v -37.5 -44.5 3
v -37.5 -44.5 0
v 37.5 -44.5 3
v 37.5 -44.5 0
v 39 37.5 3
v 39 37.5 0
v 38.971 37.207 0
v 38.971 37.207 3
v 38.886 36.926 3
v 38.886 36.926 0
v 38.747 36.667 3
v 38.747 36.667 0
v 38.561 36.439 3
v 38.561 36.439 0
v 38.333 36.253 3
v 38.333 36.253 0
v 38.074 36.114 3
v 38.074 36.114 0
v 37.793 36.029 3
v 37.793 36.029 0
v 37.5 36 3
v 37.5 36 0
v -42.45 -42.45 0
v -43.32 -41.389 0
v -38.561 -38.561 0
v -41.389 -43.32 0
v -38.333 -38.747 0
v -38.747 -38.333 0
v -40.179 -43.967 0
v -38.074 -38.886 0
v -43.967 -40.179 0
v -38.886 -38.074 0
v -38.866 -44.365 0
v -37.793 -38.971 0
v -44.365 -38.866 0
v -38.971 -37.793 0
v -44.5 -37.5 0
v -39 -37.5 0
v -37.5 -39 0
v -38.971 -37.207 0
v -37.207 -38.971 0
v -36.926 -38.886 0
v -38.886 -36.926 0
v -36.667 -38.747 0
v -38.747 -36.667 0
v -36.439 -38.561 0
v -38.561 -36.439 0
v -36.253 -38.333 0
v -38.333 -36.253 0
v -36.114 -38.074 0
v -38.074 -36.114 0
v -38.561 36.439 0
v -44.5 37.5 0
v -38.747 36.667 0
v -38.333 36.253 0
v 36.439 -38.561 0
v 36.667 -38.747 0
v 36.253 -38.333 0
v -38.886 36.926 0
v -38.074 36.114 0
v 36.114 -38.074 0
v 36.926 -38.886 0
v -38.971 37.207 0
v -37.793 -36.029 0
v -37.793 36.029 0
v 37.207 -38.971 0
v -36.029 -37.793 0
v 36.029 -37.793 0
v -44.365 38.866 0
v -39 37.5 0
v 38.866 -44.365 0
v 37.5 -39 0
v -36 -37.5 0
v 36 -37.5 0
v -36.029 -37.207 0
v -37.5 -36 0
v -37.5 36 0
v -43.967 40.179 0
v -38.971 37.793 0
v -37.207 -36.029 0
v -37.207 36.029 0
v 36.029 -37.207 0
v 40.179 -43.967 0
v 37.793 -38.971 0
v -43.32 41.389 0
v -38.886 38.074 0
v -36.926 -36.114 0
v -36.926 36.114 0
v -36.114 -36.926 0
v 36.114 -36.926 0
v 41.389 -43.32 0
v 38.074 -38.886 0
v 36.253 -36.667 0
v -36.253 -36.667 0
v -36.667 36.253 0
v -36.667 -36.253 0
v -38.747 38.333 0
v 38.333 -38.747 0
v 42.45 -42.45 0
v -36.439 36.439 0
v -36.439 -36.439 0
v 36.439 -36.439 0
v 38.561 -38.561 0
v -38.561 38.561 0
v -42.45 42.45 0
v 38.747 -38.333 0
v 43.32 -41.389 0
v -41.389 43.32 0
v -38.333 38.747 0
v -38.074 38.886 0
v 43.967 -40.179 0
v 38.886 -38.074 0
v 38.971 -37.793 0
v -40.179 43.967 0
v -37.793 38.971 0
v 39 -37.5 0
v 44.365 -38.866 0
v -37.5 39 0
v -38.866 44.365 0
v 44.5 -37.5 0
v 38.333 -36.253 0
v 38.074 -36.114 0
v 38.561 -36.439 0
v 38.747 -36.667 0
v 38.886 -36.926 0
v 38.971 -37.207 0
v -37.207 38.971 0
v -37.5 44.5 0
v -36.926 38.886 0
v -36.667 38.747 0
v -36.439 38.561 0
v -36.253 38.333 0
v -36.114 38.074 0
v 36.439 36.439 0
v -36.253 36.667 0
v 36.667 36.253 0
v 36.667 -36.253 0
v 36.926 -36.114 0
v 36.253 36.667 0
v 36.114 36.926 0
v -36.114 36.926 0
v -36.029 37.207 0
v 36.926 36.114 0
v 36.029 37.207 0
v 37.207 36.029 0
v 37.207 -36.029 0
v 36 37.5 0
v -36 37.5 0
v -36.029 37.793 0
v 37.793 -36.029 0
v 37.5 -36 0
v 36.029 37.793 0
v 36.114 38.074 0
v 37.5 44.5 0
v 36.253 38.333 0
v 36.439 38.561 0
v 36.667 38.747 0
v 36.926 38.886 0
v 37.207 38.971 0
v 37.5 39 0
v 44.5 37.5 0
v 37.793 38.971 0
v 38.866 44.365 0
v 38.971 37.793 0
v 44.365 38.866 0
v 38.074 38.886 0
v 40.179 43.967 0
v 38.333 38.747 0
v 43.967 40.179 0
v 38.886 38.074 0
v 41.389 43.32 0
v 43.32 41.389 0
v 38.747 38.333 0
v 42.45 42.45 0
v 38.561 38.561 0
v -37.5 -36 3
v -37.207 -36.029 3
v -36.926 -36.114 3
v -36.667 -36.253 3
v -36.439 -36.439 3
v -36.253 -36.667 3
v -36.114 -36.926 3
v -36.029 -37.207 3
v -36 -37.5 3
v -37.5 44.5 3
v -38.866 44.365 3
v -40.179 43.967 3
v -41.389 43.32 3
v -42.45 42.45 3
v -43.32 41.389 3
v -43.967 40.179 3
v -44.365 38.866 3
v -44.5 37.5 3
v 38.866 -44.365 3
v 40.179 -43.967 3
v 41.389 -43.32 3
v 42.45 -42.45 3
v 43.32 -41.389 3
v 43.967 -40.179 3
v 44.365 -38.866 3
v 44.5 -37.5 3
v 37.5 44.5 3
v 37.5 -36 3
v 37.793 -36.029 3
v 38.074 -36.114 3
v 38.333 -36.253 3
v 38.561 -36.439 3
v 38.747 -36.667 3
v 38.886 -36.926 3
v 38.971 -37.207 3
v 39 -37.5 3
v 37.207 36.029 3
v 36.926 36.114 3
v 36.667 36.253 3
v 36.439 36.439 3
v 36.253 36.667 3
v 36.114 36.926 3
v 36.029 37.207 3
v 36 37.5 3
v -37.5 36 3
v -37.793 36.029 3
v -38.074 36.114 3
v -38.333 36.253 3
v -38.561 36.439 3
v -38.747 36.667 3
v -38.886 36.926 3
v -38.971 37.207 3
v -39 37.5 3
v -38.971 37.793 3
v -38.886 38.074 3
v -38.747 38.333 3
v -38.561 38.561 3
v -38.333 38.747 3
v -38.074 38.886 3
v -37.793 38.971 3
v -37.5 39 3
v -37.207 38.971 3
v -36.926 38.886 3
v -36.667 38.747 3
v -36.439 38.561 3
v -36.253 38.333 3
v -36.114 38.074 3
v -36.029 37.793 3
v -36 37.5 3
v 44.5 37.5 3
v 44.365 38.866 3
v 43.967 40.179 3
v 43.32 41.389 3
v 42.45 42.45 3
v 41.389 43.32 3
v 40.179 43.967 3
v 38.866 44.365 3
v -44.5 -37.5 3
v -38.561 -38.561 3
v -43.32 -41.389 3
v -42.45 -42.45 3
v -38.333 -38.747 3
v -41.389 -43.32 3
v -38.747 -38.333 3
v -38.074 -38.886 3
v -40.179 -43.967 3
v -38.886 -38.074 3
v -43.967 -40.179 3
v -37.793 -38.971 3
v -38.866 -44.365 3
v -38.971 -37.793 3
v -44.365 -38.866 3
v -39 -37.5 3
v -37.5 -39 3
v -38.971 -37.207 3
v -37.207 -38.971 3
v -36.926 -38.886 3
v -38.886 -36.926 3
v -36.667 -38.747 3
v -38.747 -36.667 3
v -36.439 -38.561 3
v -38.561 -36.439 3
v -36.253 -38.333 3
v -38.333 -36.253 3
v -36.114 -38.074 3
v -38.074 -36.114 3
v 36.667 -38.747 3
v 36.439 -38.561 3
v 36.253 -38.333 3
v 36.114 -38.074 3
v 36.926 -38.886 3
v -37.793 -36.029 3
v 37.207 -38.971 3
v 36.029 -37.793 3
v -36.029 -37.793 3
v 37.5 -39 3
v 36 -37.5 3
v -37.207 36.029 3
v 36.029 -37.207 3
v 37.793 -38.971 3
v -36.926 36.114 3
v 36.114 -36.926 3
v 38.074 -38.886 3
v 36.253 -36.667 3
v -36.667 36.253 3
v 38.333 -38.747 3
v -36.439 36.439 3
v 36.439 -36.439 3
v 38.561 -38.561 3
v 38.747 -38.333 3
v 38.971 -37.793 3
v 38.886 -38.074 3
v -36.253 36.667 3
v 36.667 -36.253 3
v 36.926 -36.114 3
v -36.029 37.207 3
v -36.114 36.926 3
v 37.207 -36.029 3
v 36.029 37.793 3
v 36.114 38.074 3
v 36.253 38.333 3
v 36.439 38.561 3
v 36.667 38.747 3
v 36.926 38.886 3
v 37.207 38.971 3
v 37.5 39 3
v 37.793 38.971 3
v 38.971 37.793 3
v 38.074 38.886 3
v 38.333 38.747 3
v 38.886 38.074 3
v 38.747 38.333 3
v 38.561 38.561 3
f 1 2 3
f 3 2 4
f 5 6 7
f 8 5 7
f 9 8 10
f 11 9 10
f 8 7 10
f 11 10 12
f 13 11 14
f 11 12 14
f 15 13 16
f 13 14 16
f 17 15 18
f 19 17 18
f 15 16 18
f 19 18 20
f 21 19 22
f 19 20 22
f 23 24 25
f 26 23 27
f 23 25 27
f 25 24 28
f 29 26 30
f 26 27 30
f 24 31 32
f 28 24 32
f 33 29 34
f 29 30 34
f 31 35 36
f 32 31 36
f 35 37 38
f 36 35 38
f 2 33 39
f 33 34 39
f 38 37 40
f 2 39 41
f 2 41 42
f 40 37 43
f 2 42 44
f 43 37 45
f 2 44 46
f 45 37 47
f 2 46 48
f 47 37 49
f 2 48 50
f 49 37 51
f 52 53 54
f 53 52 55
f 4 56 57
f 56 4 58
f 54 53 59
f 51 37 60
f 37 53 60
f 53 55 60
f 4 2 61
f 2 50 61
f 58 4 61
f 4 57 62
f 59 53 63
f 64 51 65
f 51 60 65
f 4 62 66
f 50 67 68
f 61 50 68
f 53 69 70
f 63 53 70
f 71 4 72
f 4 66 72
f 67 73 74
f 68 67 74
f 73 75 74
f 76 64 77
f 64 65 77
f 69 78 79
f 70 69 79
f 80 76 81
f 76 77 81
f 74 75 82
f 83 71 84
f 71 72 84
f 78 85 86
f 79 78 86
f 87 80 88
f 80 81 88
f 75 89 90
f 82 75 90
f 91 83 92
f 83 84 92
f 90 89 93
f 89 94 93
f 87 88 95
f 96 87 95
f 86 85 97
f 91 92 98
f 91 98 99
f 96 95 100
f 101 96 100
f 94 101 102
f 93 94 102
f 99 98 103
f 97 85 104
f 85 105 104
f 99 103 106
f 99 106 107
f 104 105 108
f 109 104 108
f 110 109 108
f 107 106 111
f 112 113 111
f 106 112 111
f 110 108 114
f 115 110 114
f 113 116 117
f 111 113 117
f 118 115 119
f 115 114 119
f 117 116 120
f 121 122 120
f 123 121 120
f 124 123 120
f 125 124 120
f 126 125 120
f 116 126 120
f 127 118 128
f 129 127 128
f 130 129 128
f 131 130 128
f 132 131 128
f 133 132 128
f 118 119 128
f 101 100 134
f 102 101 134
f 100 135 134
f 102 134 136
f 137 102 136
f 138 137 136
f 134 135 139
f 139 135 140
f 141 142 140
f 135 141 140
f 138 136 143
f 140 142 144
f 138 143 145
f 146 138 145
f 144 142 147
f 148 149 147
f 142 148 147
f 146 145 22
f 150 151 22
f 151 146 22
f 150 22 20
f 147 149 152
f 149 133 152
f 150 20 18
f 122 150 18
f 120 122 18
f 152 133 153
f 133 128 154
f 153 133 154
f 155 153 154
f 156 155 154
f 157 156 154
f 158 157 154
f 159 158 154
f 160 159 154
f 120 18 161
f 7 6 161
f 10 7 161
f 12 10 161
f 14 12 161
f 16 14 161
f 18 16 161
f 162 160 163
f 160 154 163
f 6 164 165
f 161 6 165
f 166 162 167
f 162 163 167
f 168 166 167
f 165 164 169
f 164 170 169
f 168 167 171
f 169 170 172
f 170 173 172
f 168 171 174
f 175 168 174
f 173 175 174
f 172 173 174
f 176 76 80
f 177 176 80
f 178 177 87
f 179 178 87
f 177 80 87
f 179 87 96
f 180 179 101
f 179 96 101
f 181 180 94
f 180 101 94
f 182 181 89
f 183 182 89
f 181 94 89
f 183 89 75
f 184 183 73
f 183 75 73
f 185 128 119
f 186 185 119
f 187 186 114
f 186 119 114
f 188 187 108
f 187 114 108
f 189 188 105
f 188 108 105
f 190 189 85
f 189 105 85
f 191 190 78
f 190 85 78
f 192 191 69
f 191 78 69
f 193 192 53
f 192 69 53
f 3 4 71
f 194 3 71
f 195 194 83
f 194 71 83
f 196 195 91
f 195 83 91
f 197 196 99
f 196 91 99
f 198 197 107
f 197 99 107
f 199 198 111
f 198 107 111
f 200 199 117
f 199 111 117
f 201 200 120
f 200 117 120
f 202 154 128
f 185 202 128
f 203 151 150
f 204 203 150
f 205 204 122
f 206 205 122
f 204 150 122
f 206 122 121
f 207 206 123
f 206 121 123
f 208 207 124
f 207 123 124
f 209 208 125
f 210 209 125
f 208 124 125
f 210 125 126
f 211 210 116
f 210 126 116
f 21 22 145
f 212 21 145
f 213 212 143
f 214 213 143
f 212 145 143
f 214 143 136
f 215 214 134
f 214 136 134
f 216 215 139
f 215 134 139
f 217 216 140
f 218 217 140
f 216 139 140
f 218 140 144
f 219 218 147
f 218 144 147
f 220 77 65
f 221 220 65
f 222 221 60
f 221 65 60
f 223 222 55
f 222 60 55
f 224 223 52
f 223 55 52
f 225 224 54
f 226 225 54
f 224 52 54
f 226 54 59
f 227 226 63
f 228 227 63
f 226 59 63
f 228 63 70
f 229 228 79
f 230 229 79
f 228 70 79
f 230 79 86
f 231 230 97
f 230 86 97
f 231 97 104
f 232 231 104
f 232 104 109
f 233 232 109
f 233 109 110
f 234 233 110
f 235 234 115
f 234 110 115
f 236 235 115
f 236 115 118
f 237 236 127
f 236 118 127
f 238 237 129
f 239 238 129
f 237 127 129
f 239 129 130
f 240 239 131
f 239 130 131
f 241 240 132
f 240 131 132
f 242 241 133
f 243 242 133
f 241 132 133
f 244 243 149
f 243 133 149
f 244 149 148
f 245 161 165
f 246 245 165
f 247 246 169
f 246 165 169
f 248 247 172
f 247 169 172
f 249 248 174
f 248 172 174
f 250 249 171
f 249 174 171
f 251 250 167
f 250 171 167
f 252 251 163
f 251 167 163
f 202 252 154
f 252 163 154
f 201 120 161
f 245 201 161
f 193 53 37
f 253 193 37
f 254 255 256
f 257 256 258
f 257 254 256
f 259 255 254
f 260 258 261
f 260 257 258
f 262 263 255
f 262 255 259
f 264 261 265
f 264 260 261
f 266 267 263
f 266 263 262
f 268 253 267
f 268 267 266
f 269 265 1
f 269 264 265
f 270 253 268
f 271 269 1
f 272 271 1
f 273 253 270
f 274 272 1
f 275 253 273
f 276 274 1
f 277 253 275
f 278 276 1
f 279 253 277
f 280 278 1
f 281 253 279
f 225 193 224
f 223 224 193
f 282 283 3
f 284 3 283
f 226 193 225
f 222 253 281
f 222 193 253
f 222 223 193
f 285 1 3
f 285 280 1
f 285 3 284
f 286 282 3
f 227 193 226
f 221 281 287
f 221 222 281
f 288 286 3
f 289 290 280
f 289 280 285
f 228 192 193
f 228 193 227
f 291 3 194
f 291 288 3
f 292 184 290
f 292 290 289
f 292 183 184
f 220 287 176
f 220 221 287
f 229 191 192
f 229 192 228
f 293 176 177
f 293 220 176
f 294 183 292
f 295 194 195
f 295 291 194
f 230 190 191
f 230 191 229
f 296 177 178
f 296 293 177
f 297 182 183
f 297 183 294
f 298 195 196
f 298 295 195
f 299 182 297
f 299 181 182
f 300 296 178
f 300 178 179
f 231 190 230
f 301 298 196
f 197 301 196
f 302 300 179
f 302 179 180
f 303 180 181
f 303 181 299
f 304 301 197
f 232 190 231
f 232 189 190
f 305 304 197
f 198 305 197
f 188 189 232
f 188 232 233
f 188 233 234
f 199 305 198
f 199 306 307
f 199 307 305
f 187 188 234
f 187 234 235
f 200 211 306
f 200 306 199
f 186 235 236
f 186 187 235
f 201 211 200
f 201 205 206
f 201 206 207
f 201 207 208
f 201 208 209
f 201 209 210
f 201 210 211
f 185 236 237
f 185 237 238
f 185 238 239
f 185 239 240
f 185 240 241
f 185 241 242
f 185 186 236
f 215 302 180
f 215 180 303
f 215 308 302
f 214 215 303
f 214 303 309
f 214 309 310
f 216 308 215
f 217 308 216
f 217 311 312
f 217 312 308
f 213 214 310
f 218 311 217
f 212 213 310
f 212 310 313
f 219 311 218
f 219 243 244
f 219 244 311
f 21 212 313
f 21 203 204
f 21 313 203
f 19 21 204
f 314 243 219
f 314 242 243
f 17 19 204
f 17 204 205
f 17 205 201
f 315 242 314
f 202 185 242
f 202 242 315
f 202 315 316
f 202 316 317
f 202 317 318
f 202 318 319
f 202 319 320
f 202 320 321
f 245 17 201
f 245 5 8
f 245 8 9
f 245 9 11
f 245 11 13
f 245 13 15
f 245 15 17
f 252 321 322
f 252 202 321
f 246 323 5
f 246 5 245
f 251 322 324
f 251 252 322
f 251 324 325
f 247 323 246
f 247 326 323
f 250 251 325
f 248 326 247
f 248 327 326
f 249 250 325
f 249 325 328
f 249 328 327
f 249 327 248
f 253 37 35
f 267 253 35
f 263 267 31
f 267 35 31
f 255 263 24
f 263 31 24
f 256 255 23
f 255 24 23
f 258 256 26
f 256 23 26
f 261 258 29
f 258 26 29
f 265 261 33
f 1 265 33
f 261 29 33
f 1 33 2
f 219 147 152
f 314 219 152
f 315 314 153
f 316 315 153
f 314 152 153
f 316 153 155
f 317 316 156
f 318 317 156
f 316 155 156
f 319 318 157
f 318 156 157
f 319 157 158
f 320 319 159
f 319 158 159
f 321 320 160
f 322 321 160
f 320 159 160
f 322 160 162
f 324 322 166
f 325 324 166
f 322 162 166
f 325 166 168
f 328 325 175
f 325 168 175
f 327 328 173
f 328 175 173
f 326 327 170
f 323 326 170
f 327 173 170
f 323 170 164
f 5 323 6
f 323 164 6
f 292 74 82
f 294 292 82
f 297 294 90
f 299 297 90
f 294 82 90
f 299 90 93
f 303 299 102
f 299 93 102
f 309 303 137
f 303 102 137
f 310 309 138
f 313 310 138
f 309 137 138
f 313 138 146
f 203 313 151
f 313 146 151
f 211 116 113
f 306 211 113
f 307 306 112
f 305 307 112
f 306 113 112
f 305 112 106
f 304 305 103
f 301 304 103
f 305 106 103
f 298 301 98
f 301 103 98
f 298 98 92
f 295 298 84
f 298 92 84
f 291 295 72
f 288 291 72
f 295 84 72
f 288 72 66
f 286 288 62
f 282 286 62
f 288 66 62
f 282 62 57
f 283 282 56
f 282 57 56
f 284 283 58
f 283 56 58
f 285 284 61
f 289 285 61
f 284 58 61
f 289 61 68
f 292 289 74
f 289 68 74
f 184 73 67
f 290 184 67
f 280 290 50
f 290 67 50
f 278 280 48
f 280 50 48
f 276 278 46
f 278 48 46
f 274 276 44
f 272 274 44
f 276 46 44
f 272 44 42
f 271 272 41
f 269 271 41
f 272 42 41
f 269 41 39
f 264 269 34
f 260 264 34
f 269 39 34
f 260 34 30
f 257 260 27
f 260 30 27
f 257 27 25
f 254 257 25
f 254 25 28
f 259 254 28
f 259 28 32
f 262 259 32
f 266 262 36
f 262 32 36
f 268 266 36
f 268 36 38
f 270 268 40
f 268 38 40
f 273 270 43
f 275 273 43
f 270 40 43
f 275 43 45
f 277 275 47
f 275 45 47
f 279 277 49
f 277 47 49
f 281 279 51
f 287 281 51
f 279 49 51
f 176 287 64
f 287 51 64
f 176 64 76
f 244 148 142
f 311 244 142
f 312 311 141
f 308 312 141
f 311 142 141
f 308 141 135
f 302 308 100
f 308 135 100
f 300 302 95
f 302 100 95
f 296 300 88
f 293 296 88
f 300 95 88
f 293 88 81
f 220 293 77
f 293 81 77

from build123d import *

# Parameters (mm, degrees)
F1_DEPTH = 3


with BuildPart() as f1:
    # F0 (on Top) → F1 (new body)
    with BuildSketch(Plane.XY):
        with BuildLine():
            ThreePointArc((-37.5, 44.5), (-32.5502525317, 42.4497474683), (-30.5, 37.5))
            Line((-30.5, 37.5), (30.5, 37.5))
            ThreePointArc((30.5, 37.5), (32.5502525317, 42.4497474683), (37.5, 44.5))
            Line((37.5, 44.5), (-37.5, 44.5))
        make_face()
        with BuildLine():
            Line((30.5, -37.5), (-30.5, -37.5))
            ThreePointArc((-30.5, -37.5), (-32.550252511, -42.4497474476), (-37.4999999416, -44.5))
            Line((-37.4999999416, -44.5), (37.5, -44.5))
            ThreePointArc((37.5, -44.5), (32.5502525317, -42.4497474683), (30.5, -37.5))
        make_face()
        with BuildLine():
            ThreePointArc((44.5, 37.5), (42.4497474683, 32.5502525317), (37.5, 30.5))
            Line((37.5, 30.5), (37.5, -30.5))
            ThreePointArc((37.5, -30.5), (42.4497474683, -32.5502525317), (44.5, -37.5))
            Line((44.5, -37.5), (44.5, 37.5))
        make_face()
        with BuildLine():
            Line((-37.5, -30.5), (-37.5, 30.5))
            ThreePointArc((-37.5, 30.5), (-42.4497474683, 32.5502525317), (-44.5, 37.5))
            Line((-44.5, 37.5), (-44.5, -37.4999999639))
            ThreePointArc((-44.5, -37.4999999639), (-42.4497474555, -32.5502525189), (-37.5, -30.5))
        make_face()
        with BuildLine():
            ThreePointArc((37.5, 44.5), (32.5502525317, 42.4497474683), (30.5, 37.5))
            Line((30.5, 37.5), (36, 37.5))
            ThreePointArc((36, 37.5), (37.5, 39), (39, 37.5))
            ThreePointArc((39, 37.5), (38.5606601718, 36.4393398282), (37.5, 36))
            Line((37.5, 36), (37.5, 30.5))
            ThreePointArc((37.5, 30.5), (42.4497474683, 32.5502525317), (44.5, 37.5))
            ThreePointArc((44.5, 37.5), (42.4497474683, 42.4497474683), (37.5, 44.5))
        make_face()
        with BuildLine():
            Line((-36, 37.5), (-30.5, 37.5))
            ThreePointArc((-30.5, 37.5), (-32.5502525317, 42.4497474683), (-37.5, 44.5))
            ThreePointArc((-37.5, 44.5), (-42.4497474683, 42.4497474683), (-44.5, 37.5))
            ThreePointArc((-44.5, 37.5), (-42.4497474683, 32.5502525317), (-37.5, 30.5))
            Line((-37.5, 30.5), (-37.5, 36))
            ThreePointArc((-37.5, 36), (-38.5606601718, 38.5606601718), (-36, 37.5))
        make_face()
        with BuildLine():
            ThreePointArc((44.5, -37.5), (42.4497474683, -32.5502525317), (37.5, -30.5))
            Line((37.5, -30.5), (37.5, -36))
            ThreePointArc((37.5, -36), (38.5606601718, -36.4393398282), (39, -37.5))
            ThreePointArc((39, -37.5), (37.5, -39), (36, -37.5))
            Line((36, -37.5), (30.5, -37.5))
            ThreePointArc((30.5, -37.5), (32.5502525317, -42.4497474683), (37.5, -44.5))
            ThreePointArc((37.5, -44.5), (42.4497474683, -42.4497474683), (44.5, -37.5))
        make_face()
        with BuildLine():
            Line((-37.5, -36), (-37.5, -30.5))
            ThreePointArc((-37.5, -30.5), (-42.4497474555, -32.5502525189), (-44.5, -37.4999999639))
            ThreePointArc((-44.5, -37.4999999639), (-42.4497474604, -42.4497474762), (-37.4999999416, -44.5))
            ThreePointArc((-37.4999999416, -44.5), (-32.550252511, -42.4497474476), (-30.5, -37.5))
            Line((-30.5, -37.5), (-36, -37.5))
            ThreePointArc((-36, -37.5), (-38.5606601718, -38.5606601718), (-37.5, -36))
        make_face()
        with BuildLine():
            Line((30.5, 37.5), (-30.5, 37.5))
            ThreePointArc((-30.5, 37.5), (-32.5502525317, 32.5502525317), (-37.5, 30.5))
            Line((-37.5, 30.5), (-37.5, -30.5))
            ThreePointArc((-37.5, -30.5), (-32.5502525317, -32.5502525317), (-30.5, -37.5))
            Line((-30.5, -37.5), (30.5, -37.5))
            ThreePointArc((30.5, -37.5), (32.5502525317, -32.5502525317), (37.5, -30.5))
            Line((37.5, -30.5), (37.5, 30.5))
            ThreePointArc((37.5, 30.5), (32.5502525317, 32.5502525317), (30.5, 37.5))
        make_face()
        with BuildLine():
            ThreePointArc((-37.5, 30.5), (-32.5502525317, 32.5502525317), (-30.5, 37.5))
            Line((-30.5, 37.5), (-36, 37.5))
            ThreePointArc((-36, 37.5), (-36.4393398282, 36.4393398282), (-37.5, 36))
            Line((-37.5, 36), (-37.5, 30.5))
        make_face()
        with BuildLine():
            Line((36, 37.5), (30.5, 37.5))
            ThreePointArc((30.5, 37.5), (32.5502525317, 32.5502525317), (37.5, 30.5))
            Line((37.5, 30.5), (37.5, 36))
            ThreePointArc((37.5, 36), (36.4393398282, 36.4393398282), (36, 37.5))
        make_face()
        with BuildLine():
            Line((37.5, -36), (37.5, -30.5))
            ThreePointArc((37.5, -30.5), (32.5502525317, -32.5502525317), (30.5, -37.5))
            Line((30.5, -37.5), (36, -37.5))
            ThreePointArc((36, -37.5), (36.4393398282, -36.4393398282), (37.5, -36))
        make_face()
        with BuildLine():
            ThreePointArc((-30.5, -37.5), (-32.5502525317, -32.5502525317), (-37.5, -30.5))
            Line((-37.5, -30.5), (-37.5, -36))
            ThreePointArc((-37.5, -36), (-36.4393398282, -36.4393398282), (-36, -37.5))
            Line((-36, -37.5), (-30.5, -37.5))
        make_face()
    extrude(amount=F1_DEPTH)


solid = f1.part
